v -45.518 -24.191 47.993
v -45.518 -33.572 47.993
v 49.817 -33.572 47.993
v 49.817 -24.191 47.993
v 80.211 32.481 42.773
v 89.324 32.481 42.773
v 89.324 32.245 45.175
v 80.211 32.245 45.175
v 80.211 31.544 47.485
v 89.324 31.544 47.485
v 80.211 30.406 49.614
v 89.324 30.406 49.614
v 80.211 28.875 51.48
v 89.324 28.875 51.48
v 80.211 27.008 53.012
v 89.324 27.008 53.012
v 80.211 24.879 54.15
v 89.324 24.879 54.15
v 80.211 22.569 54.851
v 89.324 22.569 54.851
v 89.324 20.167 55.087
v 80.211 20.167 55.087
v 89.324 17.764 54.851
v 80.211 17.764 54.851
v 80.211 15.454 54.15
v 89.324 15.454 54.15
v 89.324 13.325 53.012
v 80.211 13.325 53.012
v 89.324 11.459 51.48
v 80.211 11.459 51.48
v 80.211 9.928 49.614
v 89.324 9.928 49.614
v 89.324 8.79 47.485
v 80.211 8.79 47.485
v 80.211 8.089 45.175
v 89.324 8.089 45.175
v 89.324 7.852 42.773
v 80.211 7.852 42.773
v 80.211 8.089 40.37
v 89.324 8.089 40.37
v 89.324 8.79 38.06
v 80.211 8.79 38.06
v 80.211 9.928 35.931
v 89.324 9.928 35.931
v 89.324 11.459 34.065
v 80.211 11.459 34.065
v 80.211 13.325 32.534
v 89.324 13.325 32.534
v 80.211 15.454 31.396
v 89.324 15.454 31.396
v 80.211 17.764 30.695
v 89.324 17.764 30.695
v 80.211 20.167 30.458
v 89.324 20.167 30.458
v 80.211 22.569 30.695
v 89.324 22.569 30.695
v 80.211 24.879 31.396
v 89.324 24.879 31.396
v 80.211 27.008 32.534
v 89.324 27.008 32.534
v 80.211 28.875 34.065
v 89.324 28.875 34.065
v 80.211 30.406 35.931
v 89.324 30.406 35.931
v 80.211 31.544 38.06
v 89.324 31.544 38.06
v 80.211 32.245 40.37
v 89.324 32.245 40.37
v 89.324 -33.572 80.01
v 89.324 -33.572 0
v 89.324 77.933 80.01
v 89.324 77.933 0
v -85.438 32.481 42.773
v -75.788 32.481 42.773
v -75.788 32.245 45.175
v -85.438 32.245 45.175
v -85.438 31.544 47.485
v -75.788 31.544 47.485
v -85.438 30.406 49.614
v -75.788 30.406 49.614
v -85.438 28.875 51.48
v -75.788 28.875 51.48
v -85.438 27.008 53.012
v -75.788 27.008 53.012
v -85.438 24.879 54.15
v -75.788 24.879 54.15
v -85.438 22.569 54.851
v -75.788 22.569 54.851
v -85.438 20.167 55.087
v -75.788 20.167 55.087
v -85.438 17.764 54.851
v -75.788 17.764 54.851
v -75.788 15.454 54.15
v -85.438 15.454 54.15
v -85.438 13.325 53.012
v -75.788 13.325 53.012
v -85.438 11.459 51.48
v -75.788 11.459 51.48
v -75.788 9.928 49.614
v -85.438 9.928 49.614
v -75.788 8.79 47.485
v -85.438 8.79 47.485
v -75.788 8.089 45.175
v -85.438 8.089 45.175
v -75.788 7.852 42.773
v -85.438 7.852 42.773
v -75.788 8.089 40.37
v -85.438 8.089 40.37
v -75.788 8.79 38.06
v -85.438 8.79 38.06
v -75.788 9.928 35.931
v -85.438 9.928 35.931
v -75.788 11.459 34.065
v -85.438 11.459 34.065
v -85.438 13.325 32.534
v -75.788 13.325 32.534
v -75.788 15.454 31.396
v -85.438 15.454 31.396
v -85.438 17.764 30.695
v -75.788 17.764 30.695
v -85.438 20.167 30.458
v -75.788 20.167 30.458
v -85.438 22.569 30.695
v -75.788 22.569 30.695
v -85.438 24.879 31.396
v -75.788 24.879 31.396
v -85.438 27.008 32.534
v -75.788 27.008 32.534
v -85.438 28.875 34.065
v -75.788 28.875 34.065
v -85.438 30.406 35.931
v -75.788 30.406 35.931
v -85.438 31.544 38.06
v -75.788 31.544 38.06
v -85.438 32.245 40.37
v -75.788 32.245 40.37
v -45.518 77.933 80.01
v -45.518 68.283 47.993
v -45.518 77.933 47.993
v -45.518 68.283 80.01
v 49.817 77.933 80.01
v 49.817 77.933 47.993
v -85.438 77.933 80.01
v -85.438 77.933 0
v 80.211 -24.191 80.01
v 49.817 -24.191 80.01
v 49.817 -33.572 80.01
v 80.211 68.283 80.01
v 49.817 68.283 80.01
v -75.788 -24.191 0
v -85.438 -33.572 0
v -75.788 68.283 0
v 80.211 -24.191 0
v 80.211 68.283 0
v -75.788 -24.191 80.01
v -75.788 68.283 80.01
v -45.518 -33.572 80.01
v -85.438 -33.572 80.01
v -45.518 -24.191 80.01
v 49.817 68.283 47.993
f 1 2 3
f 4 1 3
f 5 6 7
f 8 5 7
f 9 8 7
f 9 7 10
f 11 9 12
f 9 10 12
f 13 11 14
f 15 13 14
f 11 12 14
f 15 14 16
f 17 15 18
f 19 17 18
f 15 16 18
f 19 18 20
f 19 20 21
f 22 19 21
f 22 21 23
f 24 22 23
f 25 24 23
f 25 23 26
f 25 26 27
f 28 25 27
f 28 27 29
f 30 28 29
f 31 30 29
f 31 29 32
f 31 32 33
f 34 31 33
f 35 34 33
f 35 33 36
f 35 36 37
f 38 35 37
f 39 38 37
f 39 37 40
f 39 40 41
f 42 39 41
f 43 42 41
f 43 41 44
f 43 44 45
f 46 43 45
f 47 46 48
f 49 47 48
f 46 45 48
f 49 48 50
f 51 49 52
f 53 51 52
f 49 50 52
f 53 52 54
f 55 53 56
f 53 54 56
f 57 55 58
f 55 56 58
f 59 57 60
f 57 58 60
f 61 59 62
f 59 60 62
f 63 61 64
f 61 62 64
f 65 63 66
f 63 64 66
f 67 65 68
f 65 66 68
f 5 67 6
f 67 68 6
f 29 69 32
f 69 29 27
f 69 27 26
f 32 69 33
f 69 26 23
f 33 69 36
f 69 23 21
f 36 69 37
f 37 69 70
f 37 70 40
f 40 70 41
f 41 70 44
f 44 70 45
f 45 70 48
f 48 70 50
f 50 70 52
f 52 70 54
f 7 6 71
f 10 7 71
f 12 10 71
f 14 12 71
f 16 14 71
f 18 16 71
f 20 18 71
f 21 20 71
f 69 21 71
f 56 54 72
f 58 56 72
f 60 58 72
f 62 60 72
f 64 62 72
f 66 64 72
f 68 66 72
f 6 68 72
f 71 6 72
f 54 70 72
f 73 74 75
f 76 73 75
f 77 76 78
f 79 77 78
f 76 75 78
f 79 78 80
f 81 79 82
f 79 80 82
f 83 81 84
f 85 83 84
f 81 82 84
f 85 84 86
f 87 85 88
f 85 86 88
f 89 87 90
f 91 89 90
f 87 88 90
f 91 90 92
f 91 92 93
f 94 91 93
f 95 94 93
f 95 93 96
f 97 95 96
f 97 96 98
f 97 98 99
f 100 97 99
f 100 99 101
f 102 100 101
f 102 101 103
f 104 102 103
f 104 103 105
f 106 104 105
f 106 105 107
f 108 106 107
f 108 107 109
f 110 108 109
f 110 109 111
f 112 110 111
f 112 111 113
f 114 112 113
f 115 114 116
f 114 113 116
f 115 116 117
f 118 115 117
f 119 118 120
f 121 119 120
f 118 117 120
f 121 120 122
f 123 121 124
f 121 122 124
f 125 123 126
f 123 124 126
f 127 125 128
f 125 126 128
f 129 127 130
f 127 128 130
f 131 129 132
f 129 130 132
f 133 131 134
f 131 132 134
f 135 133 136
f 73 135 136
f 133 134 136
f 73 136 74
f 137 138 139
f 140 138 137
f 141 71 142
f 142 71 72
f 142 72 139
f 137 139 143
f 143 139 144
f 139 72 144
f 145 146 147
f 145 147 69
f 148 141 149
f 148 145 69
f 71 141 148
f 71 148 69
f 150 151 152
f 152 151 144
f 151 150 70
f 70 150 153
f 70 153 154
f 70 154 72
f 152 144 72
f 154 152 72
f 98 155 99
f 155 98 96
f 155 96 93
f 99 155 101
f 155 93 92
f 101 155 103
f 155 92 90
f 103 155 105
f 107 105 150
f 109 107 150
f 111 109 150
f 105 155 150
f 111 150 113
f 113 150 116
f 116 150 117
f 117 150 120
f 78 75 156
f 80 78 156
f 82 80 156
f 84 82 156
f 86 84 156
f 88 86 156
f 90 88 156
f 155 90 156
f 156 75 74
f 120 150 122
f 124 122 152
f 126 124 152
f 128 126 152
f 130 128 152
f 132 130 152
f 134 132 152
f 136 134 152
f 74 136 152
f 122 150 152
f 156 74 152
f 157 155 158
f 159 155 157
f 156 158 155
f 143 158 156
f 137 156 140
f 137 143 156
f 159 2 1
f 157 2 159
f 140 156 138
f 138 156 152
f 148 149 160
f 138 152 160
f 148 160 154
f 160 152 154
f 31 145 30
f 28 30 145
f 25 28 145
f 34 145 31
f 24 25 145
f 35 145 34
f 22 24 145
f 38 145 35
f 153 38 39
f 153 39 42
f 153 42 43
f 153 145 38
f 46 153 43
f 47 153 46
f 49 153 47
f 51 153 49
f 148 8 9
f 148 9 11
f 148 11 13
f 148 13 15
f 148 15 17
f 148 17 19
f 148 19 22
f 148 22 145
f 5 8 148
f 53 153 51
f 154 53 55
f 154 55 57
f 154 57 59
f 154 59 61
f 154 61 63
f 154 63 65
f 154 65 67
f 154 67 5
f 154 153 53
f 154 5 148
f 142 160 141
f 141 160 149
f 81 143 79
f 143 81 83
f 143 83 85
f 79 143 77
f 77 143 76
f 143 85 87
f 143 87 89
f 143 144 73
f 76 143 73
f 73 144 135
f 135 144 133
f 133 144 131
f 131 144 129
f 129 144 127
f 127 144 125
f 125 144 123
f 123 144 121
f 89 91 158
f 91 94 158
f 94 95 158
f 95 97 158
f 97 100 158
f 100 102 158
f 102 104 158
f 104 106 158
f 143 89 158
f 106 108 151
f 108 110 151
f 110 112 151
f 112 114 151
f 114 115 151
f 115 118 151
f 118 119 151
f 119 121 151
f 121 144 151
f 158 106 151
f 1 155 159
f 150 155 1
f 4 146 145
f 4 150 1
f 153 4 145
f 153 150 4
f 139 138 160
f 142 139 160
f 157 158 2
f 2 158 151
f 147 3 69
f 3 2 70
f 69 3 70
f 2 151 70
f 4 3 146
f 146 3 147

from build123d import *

# Parameters (mm, degrees)
F0_W     = 155.9993997216
F0_H     = 92.4738738686
F1_DEPTH = 80.01
F2_W     = 95.3351967037
F2_H     = 32.017163316
F3_DEPTH = 111.5057298372
F4_R     = 12.3144153275
F5_DEPTH = 174.76321174


with BuildPart() as f1:
    # F0 (on Top) → F1 (new body)
    with BuildSketch(Plane.XY):
        Polygon((-75.7883712649, 77.9326930642), (-85.4378119111, 77.9326930642), (-85.4378119111, 68.2832449675), (-85.4378119111, -24.1906289011), (-85.4378119111, -33.572036773), (80.2110284567, -33.572036773), (89.3243998289, -33.572036773), (89.3243998289, -24.1906289011), (89.3243998289, 68.2832449675), (89.3243998289, 77.9326930642), align=None)
        with Locations((2.2113285959, 22.0463080332)):
            Rectangle(F0_W, F0_H, mode=Mode.SUBTRACT)
    extrude(amount=F1_DEPTH)

    # F2 (on face) → F3 (cut, through all)
    with BuildSketch(Plane.XZ.offset(33.572036773)):
        with Locations((2.1493490785, 64.001418342)):
            Rectangle(F2_W, F2_H)
    extrude(amount=-F3_DEPTH, mode=Mode.SUBTRACT)

    # F4 (on face) → F5 (cut, through all)
    with BuildSketch(Plane.YZ.offset(89.3243998289)):
        with Locations((20.1669149101, 42.7727550268)):
            Circle(F4_R)
    extrude(amount=-F5_DEPTH, mode=Mode.SUBTRACT)


solid = f1.part
